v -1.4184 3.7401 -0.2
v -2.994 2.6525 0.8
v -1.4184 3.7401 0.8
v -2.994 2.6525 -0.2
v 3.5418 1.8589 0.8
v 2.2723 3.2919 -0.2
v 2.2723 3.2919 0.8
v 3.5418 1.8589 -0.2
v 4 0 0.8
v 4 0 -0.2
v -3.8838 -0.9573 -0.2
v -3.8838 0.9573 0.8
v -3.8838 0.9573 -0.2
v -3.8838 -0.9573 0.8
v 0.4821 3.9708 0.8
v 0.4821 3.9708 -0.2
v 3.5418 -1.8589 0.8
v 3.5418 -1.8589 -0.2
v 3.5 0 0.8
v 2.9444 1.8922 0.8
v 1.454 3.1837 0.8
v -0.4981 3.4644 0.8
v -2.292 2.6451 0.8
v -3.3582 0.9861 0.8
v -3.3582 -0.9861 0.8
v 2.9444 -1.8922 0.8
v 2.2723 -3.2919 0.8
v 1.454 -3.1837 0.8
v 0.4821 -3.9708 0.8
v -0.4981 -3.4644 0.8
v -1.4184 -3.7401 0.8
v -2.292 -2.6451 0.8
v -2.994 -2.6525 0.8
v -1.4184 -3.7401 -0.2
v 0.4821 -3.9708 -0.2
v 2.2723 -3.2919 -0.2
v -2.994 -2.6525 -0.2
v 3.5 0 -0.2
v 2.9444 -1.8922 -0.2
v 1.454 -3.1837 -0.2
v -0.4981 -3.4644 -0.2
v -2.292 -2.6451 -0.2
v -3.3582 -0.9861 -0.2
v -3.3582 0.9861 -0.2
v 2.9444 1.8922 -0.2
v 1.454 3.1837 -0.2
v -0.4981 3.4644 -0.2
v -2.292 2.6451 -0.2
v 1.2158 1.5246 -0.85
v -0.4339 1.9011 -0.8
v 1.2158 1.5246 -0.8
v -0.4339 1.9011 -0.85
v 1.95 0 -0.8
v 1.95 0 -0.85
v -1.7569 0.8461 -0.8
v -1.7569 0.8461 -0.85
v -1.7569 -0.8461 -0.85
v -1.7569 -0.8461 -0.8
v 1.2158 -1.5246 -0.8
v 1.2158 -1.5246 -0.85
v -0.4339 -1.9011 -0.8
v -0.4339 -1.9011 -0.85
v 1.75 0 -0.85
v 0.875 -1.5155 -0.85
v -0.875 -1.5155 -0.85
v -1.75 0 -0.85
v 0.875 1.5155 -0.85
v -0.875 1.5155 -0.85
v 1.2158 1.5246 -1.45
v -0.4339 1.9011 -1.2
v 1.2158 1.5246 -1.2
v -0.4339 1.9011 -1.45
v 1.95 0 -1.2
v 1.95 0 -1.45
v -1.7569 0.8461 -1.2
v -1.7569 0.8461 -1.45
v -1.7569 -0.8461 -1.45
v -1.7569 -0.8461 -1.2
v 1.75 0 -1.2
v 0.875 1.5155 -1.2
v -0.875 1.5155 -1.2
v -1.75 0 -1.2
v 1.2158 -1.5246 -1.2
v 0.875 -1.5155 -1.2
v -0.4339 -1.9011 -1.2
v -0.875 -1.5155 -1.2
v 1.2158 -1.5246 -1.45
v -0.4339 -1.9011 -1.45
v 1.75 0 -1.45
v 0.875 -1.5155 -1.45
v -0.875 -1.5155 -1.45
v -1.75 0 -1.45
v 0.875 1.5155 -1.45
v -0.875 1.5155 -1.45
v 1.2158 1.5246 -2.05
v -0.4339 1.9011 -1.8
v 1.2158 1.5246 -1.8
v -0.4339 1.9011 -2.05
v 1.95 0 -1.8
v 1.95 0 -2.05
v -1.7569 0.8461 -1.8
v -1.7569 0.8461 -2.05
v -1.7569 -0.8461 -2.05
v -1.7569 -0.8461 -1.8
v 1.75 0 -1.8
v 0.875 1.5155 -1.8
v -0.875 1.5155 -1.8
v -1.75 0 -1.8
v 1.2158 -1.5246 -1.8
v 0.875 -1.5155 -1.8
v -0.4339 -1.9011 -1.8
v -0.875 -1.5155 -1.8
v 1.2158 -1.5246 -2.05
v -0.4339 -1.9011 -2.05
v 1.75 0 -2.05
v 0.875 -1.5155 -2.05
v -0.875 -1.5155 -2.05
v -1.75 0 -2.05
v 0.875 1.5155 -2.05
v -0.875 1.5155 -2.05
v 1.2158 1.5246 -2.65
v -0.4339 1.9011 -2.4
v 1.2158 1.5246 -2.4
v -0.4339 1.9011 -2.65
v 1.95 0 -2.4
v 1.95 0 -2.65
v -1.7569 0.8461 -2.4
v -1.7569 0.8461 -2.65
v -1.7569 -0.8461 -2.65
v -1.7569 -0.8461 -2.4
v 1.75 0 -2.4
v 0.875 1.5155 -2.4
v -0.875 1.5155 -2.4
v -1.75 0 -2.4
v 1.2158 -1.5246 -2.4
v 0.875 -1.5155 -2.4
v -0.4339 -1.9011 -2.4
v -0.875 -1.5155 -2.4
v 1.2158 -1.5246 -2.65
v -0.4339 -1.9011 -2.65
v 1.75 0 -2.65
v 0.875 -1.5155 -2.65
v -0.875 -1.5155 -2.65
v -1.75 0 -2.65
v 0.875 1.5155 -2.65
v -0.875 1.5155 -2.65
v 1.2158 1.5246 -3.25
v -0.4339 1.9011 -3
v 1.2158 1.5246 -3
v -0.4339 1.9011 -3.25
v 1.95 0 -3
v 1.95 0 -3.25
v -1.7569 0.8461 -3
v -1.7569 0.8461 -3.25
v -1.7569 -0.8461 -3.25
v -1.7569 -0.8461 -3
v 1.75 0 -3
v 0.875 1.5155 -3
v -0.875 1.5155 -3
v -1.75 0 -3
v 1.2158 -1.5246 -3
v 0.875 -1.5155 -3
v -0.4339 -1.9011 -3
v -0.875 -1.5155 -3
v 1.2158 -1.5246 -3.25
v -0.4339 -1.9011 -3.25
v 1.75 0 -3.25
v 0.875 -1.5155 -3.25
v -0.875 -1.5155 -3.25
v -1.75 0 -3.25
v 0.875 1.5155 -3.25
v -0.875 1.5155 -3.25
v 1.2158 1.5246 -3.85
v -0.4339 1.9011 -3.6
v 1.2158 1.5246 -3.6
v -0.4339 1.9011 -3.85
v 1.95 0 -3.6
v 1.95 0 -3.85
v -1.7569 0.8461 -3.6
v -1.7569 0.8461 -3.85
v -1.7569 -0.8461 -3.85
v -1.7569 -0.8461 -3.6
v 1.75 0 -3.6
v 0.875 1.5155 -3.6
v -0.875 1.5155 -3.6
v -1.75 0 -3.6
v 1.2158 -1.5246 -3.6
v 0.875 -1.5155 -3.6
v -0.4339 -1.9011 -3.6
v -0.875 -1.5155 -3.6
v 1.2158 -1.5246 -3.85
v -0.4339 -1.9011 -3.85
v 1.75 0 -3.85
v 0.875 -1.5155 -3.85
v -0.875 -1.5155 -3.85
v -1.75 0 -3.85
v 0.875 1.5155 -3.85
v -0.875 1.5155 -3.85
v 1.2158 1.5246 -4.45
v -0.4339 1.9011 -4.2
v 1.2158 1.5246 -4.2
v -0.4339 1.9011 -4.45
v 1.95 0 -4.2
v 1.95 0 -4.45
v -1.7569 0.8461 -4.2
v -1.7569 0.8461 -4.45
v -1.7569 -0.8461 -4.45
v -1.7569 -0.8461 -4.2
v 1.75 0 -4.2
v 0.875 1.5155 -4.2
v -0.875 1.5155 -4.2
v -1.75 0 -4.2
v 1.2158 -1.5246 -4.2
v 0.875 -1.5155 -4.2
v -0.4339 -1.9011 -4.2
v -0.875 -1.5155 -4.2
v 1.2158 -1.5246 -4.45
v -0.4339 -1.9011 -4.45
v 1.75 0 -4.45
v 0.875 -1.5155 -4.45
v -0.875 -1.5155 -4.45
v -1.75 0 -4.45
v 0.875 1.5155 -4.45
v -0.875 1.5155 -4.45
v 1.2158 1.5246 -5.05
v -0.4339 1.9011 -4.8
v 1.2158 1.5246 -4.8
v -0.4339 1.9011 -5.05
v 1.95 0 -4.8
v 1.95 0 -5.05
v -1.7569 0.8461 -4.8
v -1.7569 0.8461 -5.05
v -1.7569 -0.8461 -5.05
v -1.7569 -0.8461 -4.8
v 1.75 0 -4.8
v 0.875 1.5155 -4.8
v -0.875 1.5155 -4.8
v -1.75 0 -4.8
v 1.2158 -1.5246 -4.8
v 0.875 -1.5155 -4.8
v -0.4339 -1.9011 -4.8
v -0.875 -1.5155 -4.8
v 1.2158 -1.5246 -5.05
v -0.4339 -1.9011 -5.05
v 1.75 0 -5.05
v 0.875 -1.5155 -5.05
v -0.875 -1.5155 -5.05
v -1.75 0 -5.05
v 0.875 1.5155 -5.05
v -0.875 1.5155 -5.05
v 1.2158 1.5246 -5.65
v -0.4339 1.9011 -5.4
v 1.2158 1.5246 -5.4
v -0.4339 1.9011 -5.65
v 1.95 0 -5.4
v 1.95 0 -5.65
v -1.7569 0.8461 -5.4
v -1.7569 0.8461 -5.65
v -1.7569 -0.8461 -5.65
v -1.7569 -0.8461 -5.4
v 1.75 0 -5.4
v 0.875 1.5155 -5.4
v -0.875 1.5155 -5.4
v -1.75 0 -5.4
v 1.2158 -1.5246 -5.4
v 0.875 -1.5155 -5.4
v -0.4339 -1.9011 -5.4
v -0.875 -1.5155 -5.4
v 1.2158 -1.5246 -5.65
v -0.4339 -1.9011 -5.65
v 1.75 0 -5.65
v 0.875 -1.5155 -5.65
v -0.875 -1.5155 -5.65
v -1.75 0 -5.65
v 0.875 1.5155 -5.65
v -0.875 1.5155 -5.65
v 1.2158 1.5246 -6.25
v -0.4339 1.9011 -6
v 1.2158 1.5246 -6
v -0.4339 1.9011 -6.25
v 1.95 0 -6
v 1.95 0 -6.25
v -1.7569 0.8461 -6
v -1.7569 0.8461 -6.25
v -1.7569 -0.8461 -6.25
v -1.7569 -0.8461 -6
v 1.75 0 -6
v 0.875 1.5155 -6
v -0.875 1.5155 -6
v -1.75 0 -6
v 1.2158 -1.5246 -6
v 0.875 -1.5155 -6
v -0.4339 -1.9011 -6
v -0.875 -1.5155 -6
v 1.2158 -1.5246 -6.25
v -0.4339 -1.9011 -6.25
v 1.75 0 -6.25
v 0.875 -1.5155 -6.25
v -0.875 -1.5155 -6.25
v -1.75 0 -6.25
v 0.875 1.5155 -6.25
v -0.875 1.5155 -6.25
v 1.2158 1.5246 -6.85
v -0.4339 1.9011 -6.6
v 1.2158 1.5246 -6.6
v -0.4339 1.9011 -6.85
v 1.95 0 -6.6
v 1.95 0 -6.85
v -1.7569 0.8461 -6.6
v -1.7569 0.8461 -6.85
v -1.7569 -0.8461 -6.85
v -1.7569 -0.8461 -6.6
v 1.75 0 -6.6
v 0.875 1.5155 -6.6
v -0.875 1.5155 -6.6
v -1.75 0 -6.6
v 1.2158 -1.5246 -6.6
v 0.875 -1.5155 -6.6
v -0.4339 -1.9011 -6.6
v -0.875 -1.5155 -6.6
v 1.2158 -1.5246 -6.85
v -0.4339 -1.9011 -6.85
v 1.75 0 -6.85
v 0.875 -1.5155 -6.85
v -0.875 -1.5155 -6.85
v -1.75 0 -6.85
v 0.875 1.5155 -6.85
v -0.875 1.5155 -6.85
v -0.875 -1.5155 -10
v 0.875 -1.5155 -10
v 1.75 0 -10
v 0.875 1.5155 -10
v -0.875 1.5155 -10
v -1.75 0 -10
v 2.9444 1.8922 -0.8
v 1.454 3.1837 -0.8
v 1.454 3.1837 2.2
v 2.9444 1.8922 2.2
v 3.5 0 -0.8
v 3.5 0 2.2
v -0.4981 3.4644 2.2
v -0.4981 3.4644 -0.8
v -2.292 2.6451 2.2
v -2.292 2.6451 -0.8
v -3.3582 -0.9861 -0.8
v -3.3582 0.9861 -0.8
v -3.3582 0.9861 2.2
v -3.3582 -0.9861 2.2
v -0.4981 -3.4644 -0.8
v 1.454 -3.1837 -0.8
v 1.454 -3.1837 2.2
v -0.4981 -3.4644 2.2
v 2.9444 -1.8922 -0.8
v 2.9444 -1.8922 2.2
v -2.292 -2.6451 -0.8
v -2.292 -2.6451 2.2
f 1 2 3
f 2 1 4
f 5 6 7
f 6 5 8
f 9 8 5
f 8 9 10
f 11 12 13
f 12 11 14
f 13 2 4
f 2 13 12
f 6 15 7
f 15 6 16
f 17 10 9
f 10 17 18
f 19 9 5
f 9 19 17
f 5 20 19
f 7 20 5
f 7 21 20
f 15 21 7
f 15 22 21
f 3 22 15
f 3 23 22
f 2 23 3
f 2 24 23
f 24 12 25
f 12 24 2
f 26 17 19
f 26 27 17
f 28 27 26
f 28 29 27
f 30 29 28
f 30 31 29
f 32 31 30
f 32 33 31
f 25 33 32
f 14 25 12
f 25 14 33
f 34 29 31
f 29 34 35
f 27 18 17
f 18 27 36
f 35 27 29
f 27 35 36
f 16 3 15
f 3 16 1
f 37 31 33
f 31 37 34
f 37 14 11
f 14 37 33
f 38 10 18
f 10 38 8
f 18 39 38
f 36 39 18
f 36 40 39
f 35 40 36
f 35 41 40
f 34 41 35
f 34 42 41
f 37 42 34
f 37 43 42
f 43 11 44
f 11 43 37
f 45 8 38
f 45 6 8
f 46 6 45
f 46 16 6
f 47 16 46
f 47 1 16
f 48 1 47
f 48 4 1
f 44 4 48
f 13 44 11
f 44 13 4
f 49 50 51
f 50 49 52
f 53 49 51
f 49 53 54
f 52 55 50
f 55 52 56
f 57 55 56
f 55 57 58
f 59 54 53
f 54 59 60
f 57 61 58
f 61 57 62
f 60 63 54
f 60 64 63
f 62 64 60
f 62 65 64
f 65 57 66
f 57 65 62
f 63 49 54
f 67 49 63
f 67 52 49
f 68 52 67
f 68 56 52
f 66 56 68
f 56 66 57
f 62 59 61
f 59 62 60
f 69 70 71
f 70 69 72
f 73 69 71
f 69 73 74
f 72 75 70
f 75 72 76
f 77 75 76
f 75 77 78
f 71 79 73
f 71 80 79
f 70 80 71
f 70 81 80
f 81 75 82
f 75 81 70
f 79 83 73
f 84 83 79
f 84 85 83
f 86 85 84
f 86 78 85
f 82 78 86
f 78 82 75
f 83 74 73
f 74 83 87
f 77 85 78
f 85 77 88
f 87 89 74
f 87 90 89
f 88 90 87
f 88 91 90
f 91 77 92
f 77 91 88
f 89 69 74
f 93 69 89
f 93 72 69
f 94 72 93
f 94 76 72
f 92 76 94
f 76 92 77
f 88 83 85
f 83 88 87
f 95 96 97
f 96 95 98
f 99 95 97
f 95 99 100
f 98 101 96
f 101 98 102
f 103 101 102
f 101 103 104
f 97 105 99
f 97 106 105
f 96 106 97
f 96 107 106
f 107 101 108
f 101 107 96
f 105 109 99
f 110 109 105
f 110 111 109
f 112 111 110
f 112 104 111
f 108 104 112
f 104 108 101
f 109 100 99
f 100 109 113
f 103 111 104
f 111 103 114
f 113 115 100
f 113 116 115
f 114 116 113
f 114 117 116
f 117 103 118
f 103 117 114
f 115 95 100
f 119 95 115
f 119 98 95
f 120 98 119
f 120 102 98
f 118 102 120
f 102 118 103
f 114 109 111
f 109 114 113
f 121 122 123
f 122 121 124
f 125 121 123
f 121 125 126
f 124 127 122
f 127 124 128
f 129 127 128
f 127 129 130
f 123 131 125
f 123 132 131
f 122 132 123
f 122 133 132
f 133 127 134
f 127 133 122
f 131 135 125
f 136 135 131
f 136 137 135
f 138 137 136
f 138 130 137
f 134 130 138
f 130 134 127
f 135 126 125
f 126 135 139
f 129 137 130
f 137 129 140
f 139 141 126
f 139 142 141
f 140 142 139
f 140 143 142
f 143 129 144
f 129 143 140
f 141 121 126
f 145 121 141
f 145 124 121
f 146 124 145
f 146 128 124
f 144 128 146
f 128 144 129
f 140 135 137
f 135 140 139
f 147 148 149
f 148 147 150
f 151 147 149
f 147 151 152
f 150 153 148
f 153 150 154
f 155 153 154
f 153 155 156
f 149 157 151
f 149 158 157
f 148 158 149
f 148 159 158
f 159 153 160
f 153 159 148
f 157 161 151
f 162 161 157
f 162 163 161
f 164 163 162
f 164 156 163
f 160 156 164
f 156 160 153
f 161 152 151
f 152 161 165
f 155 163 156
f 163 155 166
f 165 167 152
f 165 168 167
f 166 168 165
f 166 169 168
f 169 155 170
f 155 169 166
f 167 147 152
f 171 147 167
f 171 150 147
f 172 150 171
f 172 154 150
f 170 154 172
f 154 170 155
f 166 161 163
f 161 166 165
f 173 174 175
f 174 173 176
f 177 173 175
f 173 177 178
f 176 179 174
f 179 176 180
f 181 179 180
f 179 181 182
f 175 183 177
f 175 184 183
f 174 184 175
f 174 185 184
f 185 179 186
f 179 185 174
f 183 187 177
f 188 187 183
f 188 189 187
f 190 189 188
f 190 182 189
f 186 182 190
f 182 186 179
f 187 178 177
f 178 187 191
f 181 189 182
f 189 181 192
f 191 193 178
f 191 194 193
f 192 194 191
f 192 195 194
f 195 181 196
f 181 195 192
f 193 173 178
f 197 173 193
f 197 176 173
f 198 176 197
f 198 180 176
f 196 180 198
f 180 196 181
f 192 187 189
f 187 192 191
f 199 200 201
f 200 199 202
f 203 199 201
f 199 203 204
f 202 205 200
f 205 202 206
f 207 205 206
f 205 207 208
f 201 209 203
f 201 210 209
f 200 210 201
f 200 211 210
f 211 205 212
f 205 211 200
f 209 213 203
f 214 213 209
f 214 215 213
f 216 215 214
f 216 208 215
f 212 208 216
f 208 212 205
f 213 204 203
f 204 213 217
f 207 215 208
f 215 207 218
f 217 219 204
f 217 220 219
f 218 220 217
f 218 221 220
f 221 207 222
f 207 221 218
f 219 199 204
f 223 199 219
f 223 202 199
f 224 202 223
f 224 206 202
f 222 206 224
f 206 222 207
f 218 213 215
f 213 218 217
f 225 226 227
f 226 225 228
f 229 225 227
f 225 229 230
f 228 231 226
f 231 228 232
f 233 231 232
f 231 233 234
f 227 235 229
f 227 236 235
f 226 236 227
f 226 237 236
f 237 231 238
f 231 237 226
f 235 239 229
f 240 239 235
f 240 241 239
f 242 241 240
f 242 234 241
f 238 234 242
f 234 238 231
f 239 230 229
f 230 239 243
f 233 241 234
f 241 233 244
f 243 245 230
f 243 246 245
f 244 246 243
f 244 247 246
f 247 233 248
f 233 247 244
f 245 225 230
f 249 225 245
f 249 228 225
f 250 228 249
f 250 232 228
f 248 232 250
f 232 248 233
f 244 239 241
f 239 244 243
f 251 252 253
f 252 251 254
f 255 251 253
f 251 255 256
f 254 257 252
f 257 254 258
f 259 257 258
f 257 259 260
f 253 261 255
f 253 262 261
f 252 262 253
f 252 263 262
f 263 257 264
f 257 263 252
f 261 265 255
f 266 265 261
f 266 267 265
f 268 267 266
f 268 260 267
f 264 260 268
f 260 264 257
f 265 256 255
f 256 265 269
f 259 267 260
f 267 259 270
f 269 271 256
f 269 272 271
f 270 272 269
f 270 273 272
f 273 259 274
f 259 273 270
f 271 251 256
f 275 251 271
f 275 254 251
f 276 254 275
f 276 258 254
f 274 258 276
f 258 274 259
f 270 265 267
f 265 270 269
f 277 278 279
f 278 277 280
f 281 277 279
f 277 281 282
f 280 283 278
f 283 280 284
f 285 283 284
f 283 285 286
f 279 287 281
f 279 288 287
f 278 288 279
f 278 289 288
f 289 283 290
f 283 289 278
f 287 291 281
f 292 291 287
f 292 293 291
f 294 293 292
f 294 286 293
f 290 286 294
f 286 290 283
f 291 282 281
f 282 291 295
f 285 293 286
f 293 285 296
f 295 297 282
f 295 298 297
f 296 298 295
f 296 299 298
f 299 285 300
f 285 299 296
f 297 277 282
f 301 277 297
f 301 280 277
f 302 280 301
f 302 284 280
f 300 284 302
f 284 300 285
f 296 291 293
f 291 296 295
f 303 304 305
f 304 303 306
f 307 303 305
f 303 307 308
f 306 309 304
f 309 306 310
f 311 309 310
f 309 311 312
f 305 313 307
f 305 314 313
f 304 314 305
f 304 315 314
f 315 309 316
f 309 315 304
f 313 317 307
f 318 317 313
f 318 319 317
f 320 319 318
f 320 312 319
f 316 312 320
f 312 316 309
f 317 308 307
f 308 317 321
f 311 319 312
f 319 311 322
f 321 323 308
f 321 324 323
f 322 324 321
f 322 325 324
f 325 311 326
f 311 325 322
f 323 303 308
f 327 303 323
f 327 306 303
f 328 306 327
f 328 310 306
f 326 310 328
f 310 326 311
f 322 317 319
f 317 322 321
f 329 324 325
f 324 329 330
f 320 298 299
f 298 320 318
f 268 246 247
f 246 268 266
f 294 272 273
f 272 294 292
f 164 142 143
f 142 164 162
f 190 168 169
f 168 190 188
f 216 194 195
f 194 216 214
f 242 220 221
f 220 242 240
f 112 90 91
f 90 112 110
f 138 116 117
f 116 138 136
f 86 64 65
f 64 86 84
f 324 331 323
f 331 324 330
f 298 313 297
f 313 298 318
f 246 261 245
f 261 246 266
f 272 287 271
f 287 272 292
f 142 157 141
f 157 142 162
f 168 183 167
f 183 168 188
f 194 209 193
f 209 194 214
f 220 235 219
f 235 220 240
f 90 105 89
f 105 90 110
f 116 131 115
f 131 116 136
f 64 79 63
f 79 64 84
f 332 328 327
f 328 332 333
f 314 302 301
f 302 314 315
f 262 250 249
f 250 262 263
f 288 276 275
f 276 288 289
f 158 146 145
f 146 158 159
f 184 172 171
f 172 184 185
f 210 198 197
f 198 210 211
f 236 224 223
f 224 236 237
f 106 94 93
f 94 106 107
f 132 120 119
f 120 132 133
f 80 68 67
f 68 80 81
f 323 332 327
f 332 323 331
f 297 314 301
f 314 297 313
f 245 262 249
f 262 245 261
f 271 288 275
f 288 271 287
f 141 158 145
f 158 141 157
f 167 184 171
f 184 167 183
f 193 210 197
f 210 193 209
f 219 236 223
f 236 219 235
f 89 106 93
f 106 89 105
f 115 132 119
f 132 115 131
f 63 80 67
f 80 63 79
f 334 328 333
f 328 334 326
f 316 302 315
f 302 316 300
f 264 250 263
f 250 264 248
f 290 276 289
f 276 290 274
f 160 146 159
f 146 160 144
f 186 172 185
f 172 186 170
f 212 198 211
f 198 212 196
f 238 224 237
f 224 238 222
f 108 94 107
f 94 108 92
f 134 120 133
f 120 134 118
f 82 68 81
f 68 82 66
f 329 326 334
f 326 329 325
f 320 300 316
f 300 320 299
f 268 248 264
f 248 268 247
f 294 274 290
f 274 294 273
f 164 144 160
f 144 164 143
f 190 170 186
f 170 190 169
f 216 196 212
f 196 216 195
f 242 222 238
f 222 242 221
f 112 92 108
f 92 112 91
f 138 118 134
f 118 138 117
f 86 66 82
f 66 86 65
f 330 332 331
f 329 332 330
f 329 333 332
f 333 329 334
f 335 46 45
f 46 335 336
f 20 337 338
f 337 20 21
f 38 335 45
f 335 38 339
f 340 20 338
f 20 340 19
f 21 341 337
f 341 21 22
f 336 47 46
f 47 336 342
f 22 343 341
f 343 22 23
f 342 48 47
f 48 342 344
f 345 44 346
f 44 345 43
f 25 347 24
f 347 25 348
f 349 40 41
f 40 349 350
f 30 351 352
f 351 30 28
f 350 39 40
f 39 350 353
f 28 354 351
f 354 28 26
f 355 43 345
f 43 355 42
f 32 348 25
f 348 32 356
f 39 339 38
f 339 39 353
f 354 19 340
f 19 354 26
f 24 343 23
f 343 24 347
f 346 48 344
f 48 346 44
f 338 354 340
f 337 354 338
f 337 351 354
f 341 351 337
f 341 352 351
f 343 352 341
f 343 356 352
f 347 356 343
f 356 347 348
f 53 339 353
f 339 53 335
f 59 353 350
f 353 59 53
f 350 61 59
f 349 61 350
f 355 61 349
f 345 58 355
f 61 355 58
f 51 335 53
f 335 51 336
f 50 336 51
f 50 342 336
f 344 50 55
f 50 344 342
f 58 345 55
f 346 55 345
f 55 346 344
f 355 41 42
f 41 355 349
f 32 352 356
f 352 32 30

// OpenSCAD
// Parameters
shaft_diameter_mm = 3.5; //[1.75:7:0.05]
length_mm = 10; //[5:20:0.5]
head_diameter_mm = 7; //[3.5:14:0.1]
head_height_mm = 3; //[1.5:6:0.1]
threaded = 1; //[0:1:1]
thread_pitch_mm = 0.6; //[0.3:1.2:0.05]
thread_depth_mm = 0.2; //[0.05:0.5:0.01]
thread_ring_thickness_mm = 0.25; //[0.1:0.6:0.01]
thread_ring_count = 12; //[4:30:1]
washer_outer_diameter_mm = 8; //[4:16:0.1]
washer_thickness_mm = 1; //[0.5:2:0.05]
tolerance_mm = 0; //[0:0.5:0.01]
overlap_mm = 0.8; //[0.5:2:0.1]

// Screw and Washer - Complete Geometry
module screw_and_washer() {
  color("DimGray") {
    // Screw Shaft
    translate([0, 0, -length_mm/2])
      cylinder(h=length_mm, r=shaft_diameter_mm/2 + tolerance_mm, center=true);

    // Screw Head
    translate([0, 0, head_height_mm/2 - overlap_mm])
      cylinder(h=head_height_mm, r=head_diameter_mm/2 + tolerance_mm, center=true);

    // Washer
    difference() {
      translate([0, 0, -washer_thickness_mm/2 + overlap_mm])
        cylinder(h=washer_thickness_mm, r=washer_outer_diameter_mm/2 + tolerance_mm, center=true);
      translate([0, 0, -washer_thickness_mm/2 + overlap_mm])
        cylinder(h=washer_thickness_mm + 2*overlap_mm, r=shaft_diameter_mm/2 + tolerance_mm, center=true);
    }

    // Thread Representation
    if (threaded) {
      for (i = [0:thread_ring_count-1]) {
        translate([0, 0, -(thread_pitch_mm*i + thread_ring_thickness_mm/2)])
          cylinder(h=thread_ring_thickness_mm, r=shaft_diameter_mm/2 + tolerance_mm + thread_depth_mm, center=true);
      }
    }
  }
}

// Assembly
module assembly() {
  screw_and_washer();
}

assembly();
